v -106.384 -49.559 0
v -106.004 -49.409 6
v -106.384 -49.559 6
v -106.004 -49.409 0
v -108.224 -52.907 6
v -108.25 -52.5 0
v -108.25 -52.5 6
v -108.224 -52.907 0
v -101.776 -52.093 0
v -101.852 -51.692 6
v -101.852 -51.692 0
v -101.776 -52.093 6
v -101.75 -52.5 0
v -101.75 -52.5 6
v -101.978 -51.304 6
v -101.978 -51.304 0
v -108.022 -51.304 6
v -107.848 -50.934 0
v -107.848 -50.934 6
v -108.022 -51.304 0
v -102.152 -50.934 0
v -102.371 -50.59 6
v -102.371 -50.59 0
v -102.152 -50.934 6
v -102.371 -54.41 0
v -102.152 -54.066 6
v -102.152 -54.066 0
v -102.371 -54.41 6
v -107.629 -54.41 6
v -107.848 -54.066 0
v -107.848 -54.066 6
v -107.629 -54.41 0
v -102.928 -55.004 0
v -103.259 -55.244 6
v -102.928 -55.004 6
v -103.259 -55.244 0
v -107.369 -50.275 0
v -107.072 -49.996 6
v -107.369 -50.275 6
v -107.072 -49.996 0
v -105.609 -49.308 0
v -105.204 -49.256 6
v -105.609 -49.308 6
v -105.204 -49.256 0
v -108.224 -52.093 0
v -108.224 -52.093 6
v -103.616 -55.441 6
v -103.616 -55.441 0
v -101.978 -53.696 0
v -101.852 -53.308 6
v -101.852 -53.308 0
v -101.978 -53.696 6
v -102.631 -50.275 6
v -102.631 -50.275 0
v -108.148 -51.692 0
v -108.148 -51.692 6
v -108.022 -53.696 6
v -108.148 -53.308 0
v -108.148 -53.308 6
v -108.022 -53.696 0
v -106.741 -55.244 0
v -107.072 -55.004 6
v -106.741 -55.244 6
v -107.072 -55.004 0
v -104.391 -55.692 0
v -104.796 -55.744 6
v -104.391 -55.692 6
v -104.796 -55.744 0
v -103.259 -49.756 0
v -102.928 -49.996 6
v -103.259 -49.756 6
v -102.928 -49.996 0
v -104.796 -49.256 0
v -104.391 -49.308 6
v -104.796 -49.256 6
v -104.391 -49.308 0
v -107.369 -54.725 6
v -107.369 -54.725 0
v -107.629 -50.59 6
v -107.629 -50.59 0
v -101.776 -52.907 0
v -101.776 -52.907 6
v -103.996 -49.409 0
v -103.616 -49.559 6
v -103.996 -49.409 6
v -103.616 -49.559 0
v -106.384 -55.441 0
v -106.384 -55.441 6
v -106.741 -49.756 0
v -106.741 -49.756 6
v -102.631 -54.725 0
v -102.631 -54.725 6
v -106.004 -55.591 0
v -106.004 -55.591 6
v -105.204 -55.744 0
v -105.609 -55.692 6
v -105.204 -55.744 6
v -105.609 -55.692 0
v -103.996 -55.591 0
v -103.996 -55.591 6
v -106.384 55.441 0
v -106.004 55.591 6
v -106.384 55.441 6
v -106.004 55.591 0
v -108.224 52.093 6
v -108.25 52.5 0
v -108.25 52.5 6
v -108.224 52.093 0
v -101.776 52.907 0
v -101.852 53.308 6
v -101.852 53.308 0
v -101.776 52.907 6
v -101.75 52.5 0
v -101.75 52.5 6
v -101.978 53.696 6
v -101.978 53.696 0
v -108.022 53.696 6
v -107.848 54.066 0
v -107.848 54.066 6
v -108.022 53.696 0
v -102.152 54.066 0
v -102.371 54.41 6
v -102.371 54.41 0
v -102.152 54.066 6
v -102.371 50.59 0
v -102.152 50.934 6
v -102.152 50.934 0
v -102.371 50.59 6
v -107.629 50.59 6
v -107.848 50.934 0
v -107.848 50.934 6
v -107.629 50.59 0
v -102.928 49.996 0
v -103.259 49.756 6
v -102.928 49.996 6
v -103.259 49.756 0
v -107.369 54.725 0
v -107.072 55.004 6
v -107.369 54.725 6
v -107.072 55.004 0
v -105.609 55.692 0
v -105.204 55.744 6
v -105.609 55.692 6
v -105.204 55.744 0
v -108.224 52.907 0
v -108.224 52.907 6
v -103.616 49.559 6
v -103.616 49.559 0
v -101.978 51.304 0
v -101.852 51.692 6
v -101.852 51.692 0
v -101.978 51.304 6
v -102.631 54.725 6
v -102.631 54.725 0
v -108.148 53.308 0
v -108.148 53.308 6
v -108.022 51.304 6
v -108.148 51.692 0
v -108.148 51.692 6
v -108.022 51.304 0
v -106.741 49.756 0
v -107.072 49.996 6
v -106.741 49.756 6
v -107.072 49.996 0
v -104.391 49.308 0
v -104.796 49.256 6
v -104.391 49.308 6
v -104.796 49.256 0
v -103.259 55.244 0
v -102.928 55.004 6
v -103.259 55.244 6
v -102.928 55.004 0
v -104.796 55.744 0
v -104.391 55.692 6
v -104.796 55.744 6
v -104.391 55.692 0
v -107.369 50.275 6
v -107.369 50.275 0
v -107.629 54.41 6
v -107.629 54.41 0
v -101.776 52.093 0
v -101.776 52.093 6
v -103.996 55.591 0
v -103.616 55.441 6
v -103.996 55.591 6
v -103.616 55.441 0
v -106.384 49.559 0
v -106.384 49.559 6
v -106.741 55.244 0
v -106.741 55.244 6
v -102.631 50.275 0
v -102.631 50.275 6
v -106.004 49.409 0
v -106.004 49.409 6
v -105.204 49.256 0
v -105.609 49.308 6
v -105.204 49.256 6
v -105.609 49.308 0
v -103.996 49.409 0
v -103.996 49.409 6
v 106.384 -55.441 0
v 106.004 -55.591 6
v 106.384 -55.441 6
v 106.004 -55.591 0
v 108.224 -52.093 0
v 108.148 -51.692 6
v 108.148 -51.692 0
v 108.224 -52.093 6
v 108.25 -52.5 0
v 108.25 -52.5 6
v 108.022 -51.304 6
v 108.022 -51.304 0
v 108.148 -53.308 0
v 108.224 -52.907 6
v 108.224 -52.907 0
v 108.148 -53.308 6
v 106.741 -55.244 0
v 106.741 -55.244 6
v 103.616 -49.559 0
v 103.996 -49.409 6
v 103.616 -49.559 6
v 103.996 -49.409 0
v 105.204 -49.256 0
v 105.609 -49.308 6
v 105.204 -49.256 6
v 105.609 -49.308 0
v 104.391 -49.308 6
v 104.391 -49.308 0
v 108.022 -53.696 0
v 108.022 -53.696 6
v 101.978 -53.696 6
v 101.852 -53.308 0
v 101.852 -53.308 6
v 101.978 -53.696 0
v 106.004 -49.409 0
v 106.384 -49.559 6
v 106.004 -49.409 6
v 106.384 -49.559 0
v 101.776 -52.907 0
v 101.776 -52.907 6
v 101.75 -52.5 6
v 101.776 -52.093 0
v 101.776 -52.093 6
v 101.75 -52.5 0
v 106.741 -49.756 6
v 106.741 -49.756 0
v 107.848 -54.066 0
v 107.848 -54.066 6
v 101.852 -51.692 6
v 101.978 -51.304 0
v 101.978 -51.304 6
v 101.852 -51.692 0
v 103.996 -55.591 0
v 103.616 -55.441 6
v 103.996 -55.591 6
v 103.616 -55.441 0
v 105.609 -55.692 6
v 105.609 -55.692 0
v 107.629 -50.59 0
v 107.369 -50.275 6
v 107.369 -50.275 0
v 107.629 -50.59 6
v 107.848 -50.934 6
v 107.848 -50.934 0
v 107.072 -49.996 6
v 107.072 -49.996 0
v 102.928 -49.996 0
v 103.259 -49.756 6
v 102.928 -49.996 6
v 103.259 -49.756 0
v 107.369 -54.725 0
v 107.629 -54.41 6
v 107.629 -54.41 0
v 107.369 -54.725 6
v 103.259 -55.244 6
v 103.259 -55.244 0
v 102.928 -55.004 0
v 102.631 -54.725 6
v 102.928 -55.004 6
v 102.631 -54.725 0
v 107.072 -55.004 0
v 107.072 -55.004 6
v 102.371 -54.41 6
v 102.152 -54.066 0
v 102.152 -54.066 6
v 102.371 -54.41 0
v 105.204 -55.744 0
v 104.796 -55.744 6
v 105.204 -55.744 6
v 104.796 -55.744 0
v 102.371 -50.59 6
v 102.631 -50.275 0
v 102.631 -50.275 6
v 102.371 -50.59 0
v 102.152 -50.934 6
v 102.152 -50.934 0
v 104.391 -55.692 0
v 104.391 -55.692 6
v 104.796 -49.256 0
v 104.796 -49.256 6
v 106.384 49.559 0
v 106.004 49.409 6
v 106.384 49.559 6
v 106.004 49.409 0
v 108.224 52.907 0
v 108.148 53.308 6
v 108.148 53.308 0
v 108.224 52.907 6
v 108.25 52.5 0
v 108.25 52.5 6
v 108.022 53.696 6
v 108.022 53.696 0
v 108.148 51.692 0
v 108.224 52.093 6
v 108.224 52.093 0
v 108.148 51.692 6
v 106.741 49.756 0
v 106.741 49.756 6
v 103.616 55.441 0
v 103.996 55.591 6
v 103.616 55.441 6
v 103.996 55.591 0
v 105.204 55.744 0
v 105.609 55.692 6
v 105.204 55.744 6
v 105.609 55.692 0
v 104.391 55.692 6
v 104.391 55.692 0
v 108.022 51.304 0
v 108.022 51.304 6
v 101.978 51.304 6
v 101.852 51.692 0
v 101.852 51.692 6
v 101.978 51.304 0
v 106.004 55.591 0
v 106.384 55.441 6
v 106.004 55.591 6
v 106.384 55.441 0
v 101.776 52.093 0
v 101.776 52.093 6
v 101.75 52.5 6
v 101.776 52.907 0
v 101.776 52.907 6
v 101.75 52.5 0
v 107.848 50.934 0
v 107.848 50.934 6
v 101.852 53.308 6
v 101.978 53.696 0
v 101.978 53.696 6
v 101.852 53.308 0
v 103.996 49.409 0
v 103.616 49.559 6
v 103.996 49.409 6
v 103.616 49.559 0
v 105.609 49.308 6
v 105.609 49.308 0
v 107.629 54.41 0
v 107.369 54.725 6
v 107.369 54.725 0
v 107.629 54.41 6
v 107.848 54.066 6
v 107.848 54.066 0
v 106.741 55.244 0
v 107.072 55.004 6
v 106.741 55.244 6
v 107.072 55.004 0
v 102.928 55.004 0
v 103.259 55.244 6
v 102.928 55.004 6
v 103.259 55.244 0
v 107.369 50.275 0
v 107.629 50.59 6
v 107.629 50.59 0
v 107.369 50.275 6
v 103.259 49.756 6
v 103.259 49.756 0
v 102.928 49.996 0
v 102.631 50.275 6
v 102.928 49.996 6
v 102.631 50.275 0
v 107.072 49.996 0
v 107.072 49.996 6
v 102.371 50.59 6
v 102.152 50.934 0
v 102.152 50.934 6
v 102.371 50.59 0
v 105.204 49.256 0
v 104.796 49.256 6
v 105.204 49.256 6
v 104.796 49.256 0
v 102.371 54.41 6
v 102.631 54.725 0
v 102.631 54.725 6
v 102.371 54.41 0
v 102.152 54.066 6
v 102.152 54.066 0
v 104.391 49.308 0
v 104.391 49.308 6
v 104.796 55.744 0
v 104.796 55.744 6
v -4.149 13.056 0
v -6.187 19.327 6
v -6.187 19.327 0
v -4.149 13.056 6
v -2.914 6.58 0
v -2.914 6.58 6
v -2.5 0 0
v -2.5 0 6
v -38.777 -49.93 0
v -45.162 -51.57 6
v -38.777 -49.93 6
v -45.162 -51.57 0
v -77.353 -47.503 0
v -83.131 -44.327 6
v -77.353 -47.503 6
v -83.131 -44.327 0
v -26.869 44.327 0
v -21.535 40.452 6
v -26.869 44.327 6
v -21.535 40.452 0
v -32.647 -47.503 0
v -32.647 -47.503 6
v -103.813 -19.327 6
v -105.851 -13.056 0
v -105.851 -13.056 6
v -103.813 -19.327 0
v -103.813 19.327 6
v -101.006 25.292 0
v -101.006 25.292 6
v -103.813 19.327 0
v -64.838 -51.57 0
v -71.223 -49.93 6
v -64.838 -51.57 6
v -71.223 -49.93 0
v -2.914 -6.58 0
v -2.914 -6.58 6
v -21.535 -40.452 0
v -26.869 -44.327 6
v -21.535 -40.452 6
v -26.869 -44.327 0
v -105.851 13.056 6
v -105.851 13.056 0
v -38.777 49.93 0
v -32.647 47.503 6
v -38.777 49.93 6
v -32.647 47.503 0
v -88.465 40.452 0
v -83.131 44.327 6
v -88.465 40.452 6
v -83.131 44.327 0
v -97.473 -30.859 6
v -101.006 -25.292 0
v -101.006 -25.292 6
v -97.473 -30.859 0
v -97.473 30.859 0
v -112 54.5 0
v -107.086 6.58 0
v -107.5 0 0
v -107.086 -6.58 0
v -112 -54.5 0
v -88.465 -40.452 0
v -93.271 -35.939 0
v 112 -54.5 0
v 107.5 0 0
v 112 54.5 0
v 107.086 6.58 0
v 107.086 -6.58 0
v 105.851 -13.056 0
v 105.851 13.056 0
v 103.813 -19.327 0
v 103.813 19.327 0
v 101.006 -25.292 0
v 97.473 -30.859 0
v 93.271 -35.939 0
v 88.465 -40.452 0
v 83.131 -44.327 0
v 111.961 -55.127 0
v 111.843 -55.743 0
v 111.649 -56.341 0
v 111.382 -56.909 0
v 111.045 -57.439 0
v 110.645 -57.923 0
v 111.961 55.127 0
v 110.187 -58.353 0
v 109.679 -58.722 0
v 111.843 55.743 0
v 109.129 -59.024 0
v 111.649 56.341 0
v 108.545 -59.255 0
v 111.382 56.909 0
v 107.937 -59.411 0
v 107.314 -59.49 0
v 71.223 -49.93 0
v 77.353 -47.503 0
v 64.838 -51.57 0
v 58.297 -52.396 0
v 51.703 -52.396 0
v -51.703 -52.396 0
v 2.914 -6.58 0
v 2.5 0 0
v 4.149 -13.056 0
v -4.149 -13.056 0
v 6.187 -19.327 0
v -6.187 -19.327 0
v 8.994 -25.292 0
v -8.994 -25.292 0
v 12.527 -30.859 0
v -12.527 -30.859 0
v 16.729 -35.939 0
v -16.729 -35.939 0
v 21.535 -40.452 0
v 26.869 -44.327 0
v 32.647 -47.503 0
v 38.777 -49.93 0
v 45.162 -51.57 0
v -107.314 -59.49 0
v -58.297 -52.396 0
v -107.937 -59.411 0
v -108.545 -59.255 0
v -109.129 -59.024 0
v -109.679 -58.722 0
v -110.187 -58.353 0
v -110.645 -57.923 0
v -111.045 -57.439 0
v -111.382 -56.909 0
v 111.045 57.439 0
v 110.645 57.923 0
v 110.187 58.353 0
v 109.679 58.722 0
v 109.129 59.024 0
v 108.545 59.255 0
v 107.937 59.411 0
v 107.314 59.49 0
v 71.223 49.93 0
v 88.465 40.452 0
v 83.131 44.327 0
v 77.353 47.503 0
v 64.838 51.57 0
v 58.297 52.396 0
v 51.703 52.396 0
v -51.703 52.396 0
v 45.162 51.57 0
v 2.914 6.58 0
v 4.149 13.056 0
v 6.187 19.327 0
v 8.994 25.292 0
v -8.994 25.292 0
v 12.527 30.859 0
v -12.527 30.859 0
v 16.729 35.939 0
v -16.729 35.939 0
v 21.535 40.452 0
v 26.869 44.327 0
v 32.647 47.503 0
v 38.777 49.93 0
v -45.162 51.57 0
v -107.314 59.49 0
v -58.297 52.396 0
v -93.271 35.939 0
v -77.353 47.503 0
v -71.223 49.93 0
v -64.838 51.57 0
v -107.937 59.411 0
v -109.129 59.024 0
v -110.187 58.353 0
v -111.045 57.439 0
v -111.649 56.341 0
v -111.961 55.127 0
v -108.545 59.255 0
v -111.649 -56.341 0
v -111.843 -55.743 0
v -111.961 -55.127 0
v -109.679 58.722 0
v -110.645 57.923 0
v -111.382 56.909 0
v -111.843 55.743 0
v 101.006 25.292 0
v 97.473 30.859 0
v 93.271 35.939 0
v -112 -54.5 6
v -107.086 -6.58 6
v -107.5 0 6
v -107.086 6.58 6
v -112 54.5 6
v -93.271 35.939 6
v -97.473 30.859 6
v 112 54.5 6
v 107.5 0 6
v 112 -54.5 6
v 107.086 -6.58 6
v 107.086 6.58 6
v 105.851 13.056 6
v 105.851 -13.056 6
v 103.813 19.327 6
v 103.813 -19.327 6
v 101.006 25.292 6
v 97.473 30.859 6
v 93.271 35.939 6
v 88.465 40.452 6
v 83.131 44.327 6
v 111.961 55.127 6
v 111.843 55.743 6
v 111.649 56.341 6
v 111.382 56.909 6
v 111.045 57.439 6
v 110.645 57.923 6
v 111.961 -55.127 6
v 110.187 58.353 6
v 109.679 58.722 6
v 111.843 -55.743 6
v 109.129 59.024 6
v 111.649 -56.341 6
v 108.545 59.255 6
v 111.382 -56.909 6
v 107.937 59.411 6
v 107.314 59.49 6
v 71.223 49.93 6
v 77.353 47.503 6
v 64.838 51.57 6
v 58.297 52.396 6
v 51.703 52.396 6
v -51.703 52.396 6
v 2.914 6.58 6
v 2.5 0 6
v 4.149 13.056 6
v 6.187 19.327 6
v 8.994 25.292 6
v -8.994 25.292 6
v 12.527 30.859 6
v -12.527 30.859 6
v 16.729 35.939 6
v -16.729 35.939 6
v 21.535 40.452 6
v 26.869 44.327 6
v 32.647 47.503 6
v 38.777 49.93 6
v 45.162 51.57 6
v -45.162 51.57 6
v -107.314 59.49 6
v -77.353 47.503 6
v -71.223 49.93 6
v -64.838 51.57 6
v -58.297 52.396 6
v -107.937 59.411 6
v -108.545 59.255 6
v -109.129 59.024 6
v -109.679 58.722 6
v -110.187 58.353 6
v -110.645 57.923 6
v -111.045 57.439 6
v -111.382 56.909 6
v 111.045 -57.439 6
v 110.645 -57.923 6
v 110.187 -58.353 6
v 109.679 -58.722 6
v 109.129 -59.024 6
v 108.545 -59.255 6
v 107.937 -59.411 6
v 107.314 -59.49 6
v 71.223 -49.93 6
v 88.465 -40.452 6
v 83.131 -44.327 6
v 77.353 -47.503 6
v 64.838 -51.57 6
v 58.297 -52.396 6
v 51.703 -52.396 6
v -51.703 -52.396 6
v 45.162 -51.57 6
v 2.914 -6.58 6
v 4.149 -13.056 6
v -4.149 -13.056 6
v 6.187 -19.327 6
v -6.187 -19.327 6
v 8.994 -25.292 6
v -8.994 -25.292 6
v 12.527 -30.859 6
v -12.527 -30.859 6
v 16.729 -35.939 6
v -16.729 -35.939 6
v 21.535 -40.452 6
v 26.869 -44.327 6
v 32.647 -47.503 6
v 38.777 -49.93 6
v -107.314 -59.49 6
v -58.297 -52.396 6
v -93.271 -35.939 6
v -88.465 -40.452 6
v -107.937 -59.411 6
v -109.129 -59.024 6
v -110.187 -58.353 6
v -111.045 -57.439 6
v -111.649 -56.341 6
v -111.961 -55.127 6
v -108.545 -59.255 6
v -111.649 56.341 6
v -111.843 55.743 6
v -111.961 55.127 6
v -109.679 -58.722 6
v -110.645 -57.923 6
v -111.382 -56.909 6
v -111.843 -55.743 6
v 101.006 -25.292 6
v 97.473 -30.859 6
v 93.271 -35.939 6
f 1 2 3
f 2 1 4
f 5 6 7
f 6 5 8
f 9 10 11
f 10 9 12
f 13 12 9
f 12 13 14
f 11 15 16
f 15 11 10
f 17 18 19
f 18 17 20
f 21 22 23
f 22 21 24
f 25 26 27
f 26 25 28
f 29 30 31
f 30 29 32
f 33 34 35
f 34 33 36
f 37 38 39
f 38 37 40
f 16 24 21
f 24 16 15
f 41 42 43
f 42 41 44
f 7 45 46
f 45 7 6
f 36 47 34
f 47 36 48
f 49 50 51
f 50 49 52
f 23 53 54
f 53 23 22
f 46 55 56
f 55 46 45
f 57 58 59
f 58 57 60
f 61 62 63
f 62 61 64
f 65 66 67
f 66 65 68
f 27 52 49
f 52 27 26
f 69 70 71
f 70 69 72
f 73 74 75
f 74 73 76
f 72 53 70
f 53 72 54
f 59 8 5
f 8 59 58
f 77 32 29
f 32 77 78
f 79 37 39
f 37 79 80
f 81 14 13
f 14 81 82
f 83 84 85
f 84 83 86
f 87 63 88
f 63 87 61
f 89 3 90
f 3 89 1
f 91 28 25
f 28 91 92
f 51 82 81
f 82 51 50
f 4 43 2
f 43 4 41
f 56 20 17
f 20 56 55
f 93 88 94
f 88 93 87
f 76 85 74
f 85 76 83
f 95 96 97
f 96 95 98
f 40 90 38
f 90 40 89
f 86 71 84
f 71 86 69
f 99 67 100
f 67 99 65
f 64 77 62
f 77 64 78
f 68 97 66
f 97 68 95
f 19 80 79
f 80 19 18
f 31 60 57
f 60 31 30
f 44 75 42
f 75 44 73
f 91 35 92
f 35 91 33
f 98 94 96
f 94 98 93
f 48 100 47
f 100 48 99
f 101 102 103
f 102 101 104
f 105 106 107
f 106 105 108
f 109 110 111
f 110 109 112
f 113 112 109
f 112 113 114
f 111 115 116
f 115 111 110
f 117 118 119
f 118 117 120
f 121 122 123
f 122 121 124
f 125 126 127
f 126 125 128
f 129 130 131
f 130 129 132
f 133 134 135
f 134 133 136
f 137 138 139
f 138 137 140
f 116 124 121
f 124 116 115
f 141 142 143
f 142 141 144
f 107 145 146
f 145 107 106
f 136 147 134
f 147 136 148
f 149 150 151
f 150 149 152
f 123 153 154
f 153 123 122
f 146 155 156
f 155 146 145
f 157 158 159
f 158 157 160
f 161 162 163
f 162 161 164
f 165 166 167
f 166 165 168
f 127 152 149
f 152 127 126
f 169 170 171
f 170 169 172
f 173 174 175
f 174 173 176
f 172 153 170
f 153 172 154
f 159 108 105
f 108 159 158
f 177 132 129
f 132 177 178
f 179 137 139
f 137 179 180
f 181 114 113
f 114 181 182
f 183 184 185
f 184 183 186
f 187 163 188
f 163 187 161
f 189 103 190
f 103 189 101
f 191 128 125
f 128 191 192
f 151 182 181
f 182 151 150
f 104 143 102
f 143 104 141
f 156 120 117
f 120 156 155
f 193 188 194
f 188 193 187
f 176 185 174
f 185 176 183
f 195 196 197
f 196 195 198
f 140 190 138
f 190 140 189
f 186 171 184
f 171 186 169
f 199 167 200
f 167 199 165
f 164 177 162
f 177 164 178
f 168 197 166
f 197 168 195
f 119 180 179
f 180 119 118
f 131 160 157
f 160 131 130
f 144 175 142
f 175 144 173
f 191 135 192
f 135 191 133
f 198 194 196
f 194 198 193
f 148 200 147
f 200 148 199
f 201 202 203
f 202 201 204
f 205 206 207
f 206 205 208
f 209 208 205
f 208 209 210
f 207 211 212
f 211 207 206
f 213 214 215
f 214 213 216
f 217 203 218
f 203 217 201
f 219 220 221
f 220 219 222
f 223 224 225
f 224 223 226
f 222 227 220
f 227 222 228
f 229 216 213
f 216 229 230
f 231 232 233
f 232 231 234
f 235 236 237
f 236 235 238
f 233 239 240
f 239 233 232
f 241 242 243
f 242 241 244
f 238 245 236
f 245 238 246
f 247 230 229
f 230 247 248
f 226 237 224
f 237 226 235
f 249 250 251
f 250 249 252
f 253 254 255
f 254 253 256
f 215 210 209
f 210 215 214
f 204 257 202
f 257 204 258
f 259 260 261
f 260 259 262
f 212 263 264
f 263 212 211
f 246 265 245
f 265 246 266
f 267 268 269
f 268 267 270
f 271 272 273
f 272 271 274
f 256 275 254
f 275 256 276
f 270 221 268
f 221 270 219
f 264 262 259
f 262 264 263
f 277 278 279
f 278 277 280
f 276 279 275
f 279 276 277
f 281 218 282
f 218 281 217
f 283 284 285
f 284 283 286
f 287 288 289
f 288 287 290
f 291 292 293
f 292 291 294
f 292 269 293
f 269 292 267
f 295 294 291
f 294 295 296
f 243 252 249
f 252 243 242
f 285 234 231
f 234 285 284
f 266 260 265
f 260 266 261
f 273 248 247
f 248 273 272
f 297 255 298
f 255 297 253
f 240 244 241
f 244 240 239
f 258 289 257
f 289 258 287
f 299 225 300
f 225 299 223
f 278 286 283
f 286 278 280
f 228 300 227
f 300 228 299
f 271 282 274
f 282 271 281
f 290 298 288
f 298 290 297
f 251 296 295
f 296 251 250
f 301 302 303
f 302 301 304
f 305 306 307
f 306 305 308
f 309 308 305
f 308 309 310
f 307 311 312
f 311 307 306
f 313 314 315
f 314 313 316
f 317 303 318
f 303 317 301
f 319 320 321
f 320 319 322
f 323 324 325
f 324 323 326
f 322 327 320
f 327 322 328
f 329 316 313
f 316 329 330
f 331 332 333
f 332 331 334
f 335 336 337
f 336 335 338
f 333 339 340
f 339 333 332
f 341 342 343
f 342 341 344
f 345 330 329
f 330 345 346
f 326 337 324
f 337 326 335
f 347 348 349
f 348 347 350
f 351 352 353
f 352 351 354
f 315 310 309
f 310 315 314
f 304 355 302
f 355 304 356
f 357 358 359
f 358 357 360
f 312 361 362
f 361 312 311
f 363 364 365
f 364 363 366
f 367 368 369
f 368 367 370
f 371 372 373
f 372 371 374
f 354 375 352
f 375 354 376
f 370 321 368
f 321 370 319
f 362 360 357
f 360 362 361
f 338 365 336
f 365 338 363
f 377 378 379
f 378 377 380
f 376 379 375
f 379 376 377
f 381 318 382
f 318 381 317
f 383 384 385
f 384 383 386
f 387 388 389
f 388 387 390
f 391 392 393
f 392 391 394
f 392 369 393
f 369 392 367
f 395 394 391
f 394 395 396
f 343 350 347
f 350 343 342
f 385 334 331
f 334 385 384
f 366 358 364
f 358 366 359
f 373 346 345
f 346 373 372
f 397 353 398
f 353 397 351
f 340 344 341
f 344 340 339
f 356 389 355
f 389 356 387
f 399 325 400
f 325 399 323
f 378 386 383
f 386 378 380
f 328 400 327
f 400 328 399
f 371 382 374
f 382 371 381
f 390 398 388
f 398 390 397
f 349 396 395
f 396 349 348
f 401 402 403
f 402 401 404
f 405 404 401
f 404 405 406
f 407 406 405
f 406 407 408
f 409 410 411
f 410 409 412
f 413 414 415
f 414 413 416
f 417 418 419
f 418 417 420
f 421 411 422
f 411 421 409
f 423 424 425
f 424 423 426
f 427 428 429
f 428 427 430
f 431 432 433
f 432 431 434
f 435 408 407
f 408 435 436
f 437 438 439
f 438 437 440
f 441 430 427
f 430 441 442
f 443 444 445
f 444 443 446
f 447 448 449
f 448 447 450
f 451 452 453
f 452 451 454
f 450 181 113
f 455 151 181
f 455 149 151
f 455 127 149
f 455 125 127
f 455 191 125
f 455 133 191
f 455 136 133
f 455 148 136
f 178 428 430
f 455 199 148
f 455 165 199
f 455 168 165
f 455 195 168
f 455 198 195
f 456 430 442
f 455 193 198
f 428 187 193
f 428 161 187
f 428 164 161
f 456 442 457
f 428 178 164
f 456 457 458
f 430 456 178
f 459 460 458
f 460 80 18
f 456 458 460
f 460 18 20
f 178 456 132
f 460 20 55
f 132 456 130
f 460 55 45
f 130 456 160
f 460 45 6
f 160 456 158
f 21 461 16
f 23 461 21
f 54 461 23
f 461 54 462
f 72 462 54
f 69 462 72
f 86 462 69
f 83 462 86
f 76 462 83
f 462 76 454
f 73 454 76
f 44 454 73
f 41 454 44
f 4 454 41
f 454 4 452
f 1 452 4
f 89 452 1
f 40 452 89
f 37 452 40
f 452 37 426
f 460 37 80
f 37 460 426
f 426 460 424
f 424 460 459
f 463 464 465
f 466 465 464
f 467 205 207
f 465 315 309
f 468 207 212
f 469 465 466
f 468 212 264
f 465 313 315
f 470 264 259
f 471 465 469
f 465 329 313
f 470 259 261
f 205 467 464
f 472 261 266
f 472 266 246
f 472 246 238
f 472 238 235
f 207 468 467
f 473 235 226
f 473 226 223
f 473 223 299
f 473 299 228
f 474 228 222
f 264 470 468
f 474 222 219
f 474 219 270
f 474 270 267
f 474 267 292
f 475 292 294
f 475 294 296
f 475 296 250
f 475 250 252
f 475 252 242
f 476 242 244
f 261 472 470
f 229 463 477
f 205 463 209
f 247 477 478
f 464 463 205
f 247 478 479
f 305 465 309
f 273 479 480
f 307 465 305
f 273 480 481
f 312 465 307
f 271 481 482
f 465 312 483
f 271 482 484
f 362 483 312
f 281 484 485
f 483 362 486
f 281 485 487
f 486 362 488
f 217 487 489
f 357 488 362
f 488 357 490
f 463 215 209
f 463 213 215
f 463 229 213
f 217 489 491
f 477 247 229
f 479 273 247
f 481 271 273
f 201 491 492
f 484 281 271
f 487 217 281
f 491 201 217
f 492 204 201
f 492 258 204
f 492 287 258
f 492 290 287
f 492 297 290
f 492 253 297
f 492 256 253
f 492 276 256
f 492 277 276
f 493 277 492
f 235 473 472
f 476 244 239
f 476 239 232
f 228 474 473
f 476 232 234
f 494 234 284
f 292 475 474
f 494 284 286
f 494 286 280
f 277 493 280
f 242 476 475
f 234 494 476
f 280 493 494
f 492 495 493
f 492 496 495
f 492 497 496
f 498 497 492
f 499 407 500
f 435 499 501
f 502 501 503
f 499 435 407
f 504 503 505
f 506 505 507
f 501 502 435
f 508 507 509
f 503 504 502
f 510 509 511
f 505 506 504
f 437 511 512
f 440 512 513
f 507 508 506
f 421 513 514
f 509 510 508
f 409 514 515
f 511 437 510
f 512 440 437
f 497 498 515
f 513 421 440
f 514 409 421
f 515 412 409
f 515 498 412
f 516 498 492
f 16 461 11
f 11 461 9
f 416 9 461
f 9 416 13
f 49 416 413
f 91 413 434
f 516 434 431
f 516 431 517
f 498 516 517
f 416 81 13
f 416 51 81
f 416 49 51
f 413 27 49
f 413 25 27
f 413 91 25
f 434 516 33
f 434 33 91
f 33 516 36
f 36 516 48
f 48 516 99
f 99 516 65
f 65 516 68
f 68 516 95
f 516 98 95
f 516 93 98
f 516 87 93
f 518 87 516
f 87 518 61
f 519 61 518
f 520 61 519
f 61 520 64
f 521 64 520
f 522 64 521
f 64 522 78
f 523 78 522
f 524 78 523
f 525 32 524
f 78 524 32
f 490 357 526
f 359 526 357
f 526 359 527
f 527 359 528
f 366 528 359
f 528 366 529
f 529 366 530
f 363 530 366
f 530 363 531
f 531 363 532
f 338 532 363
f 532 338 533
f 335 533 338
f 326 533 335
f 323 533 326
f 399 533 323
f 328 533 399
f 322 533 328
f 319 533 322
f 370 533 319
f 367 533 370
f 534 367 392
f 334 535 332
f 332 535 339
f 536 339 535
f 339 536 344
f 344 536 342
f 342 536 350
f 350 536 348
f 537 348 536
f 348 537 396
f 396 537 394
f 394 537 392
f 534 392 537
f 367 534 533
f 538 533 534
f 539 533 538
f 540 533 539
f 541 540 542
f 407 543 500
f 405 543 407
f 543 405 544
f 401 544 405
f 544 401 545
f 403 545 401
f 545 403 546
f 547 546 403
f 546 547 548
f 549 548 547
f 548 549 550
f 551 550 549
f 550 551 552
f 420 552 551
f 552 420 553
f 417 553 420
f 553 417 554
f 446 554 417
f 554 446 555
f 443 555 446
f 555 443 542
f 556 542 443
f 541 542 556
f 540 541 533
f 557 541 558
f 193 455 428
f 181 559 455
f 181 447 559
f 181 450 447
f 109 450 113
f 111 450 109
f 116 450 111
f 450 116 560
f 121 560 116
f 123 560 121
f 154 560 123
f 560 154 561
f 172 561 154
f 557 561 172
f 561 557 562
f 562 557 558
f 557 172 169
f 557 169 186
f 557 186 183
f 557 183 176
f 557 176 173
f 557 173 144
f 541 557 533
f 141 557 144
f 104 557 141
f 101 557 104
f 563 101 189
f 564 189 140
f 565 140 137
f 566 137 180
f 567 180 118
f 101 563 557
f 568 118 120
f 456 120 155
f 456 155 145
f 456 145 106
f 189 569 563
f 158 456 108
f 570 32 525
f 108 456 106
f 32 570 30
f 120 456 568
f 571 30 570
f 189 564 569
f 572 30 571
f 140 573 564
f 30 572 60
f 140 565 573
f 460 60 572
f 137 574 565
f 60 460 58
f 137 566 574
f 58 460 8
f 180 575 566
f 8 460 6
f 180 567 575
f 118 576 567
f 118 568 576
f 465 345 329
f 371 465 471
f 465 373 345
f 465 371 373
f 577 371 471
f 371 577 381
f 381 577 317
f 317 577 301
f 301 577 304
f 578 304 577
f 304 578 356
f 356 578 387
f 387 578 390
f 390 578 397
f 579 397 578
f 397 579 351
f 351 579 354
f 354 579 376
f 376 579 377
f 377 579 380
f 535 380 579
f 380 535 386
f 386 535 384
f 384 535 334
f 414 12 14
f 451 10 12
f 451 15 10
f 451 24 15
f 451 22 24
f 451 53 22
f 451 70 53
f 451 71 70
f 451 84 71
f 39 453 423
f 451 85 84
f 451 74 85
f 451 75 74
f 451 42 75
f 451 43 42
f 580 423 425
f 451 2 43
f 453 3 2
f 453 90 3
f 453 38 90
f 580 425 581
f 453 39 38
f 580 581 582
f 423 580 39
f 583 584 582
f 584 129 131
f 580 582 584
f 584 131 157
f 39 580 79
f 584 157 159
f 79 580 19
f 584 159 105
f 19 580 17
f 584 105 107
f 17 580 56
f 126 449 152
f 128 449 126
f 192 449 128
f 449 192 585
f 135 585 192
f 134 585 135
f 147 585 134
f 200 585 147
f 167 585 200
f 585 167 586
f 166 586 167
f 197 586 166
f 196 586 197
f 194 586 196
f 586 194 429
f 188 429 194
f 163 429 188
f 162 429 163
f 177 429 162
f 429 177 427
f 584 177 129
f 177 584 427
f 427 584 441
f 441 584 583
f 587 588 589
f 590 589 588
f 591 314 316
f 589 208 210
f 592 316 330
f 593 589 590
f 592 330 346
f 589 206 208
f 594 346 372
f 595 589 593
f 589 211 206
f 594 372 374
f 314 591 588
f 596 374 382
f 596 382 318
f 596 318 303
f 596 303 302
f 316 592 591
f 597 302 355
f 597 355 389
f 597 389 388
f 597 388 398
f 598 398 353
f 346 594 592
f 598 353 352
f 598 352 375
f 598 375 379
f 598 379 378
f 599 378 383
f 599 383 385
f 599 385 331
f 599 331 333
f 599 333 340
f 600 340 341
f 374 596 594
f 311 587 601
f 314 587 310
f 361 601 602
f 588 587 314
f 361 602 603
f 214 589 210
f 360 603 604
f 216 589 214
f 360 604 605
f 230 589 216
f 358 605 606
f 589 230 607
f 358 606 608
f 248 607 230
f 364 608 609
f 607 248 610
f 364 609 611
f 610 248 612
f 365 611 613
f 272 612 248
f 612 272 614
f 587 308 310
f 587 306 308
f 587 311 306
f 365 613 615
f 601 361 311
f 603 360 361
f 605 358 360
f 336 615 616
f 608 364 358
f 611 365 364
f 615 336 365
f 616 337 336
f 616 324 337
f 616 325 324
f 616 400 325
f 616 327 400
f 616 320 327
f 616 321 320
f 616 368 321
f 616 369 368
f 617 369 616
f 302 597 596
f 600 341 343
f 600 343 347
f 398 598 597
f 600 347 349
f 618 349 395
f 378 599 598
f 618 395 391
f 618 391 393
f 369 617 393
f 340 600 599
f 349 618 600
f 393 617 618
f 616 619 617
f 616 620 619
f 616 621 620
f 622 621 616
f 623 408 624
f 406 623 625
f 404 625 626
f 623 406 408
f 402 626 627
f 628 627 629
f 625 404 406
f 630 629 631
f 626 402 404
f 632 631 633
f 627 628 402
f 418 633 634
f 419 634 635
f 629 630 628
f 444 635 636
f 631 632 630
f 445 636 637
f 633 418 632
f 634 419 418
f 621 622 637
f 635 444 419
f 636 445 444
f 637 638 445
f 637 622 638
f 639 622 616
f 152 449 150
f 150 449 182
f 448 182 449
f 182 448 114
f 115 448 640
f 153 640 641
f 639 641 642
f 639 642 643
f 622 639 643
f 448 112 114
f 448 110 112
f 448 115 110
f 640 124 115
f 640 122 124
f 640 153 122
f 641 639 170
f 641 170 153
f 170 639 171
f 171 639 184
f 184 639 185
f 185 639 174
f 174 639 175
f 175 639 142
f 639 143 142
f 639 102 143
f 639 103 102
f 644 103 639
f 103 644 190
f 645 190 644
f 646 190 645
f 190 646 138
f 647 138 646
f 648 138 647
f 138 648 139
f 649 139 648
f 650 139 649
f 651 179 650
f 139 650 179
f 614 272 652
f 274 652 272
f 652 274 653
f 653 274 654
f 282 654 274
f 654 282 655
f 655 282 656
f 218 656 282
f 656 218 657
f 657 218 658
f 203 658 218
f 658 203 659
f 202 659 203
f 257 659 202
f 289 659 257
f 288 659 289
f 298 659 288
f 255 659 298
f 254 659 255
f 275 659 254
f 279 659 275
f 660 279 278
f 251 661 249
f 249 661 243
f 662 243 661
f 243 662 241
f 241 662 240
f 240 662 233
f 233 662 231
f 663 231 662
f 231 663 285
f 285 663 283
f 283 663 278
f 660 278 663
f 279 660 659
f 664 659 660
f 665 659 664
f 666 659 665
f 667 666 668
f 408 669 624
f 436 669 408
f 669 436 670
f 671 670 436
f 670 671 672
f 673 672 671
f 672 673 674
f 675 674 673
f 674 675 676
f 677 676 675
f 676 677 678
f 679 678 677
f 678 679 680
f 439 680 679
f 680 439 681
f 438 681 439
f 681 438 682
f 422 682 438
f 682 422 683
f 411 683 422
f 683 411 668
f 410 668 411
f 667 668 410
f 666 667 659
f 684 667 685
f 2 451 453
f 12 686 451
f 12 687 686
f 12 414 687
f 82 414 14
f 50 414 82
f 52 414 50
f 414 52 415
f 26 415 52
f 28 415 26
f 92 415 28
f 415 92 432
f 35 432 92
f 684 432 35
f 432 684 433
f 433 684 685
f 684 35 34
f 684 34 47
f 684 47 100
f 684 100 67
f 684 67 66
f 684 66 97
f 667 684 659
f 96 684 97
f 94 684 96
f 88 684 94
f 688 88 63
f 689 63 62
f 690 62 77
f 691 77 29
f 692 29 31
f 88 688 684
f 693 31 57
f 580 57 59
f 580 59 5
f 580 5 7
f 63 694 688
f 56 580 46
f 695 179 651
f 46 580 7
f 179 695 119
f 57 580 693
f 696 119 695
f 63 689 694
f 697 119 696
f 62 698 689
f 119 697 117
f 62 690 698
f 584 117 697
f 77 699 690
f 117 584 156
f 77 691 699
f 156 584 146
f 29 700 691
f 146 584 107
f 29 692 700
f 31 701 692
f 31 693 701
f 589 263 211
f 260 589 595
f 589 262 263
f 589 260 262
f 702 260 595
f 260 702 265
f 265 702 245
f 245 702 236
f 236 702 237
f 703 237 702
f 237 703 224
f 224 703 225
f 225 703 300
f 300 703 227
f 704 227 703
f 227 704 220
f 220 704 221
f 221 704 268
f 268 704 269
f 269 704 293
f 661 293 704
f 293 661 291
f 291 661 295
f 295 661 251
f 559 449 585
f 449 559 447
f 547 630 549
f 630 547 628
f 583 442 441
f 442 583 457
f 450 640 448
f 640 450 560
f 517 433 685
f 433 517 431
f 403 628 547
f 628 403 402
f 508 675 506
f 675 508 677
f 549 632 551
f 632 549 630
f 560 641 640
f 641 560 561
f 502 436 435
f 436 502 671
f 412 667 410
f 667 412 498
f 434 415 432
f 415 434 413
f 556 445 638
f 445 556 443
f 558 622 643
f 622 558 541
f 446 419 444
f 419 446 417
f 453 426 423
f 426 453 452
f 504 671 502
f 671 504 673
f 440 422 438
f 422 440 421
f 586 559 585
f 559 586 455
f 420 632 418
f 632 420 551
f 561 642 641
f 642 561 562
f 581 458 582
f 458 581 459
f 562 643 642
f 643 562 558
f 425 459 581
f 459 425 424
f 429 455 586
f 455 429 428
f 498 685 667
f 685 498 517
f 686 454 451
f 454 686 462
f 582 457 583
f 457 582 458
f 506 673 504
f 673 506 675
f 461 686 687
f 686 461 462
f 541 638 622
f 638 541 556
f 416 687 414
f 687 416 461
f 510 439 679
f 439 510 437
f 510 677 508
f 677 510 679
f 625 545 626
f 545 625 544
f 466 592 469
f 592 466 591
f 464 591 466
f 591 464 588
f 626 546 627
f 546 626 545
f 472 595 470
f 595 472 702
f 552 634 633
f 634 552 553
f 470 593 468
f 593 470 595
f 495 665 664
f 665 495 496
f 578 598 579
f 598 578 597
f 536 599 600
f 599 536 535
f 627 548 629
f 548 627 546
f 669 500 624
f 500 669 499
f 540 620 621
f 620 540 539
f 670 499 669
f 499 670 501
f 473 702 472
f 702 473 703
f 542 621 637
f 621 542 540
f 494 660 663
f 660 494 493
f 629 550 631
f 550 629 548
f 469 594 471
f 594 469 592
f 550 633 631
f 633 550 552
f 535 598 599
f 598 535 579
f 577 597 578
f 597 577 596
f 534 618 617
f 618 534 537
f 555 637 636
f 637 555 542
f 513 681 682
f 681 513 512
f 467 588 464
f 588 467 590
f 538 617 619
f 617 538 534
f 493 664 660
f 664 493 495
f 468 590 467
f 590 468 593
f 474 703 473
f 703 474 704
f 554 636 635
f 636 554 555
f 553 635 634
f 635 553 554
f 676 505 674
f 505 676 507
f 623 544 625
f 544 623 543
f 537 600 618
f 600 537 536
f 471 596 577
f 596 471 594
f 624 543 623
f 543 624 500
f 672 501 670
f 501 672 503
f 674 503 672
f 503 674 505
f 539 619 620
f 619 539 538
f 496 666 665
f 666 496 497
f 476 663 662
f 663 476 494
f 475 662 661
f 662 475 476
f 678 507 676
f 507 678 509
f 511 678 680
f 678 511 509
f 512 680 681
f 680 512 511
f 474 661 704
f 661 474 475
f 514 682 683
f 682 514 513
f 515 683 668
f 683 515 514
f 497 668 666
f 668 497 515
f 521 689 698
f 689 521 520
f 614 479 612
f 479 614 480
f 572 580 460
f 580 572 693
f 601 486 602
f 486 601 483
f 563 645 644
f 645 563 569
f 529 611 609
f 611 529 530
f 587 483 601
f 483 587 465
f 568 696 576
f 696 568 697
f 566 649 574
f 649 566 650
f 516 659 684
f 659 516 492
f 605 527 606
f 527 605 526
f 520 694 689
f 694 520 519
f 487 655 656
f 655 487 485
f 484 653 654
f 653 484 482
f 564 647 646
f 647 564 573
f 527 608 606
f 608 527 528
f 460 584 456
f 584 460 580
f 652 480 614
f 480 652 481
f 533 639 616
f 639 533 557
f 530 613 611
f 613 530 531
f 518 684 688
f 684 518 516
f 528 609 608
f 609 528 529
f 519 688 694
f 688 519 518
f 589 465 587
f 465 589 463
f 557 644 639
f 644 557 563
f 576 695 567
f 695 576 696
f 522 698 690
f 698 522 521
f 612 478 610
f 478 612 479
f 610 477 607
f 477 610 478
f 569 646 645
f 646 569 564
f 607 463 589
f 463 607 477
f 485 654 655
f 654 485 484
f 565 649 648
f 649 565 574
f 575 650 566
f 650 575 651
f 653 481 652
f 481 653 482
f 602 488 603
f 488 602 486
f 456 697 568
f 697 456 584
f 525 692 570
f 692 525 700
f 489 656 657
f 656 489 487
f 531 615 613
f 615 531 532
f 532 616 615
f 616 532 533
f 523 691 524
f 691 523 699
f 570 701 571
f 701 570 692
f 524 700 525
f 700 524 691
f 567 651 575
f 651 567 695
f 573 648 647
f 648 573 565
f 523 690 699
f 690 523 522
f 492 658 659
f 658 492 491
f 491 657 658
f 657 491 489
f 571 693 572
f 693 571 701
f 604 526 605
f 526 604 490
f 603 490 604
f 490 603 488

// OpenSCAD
$fn = 50;

difference() {
	union() {
		hull() {
			translate(v = [-107.0, 54.5, 0]) {
				cylinder(h = 6, r = 5);
			}
			translate(v = [107.0, 54.5, 0]) {
				cylinder(h = 6, r = 5);
			}
			translate(v = [-107.0, -54.5, 0]) {
				cylinder(h = 6, r = 5);
			}
			translate(v = [107.0, -54.5, 0]) {
				cylinder(h = 6, r = 5);
			}
		}
	}
	union() {
		translate(v = [-105.0, -52.5, -100.0]) {
			cylinder(h = 200, r = 3.25);
		}
		translate(v = [-105.0, 52.5, -100.0]) {
			cylinder(h = 200, r = 3.25);
		}
		translate(v = [105.0, -52.5, -100.0]) {
			cylinder(h = 200, r = 3.25);
		}
		translate(v = [105.0, 52.5, -100.0]) {
			cylinder(h = 200, r = 3.25);
		}
		translate(v = [-105.0, -52.5, -100.0]) {
			cylinder(h = 200, r = 1.8);
		}
		translate(v = [-105.0, 52.5, -100.0]) {
			cylinder(h = 200, r = 1.8);
		}
		translate(v = [105.0, -52.5, -100.0]) {
			cylinder(h = 200, r = 1.8);
		}
		translate(v = [105.0, 52.5, -100.0]) {
			cylinder(h = 200, r = 1.8);
		}
		translate(v = [-55.0, 0, 0.0]) {
			cylinder(h = 6, r = 52.5);
		}
		translate(v = [55.0, 0, 0.0]) {
			cylinder(h = 6, r = 52.5);
		}
	}
}
